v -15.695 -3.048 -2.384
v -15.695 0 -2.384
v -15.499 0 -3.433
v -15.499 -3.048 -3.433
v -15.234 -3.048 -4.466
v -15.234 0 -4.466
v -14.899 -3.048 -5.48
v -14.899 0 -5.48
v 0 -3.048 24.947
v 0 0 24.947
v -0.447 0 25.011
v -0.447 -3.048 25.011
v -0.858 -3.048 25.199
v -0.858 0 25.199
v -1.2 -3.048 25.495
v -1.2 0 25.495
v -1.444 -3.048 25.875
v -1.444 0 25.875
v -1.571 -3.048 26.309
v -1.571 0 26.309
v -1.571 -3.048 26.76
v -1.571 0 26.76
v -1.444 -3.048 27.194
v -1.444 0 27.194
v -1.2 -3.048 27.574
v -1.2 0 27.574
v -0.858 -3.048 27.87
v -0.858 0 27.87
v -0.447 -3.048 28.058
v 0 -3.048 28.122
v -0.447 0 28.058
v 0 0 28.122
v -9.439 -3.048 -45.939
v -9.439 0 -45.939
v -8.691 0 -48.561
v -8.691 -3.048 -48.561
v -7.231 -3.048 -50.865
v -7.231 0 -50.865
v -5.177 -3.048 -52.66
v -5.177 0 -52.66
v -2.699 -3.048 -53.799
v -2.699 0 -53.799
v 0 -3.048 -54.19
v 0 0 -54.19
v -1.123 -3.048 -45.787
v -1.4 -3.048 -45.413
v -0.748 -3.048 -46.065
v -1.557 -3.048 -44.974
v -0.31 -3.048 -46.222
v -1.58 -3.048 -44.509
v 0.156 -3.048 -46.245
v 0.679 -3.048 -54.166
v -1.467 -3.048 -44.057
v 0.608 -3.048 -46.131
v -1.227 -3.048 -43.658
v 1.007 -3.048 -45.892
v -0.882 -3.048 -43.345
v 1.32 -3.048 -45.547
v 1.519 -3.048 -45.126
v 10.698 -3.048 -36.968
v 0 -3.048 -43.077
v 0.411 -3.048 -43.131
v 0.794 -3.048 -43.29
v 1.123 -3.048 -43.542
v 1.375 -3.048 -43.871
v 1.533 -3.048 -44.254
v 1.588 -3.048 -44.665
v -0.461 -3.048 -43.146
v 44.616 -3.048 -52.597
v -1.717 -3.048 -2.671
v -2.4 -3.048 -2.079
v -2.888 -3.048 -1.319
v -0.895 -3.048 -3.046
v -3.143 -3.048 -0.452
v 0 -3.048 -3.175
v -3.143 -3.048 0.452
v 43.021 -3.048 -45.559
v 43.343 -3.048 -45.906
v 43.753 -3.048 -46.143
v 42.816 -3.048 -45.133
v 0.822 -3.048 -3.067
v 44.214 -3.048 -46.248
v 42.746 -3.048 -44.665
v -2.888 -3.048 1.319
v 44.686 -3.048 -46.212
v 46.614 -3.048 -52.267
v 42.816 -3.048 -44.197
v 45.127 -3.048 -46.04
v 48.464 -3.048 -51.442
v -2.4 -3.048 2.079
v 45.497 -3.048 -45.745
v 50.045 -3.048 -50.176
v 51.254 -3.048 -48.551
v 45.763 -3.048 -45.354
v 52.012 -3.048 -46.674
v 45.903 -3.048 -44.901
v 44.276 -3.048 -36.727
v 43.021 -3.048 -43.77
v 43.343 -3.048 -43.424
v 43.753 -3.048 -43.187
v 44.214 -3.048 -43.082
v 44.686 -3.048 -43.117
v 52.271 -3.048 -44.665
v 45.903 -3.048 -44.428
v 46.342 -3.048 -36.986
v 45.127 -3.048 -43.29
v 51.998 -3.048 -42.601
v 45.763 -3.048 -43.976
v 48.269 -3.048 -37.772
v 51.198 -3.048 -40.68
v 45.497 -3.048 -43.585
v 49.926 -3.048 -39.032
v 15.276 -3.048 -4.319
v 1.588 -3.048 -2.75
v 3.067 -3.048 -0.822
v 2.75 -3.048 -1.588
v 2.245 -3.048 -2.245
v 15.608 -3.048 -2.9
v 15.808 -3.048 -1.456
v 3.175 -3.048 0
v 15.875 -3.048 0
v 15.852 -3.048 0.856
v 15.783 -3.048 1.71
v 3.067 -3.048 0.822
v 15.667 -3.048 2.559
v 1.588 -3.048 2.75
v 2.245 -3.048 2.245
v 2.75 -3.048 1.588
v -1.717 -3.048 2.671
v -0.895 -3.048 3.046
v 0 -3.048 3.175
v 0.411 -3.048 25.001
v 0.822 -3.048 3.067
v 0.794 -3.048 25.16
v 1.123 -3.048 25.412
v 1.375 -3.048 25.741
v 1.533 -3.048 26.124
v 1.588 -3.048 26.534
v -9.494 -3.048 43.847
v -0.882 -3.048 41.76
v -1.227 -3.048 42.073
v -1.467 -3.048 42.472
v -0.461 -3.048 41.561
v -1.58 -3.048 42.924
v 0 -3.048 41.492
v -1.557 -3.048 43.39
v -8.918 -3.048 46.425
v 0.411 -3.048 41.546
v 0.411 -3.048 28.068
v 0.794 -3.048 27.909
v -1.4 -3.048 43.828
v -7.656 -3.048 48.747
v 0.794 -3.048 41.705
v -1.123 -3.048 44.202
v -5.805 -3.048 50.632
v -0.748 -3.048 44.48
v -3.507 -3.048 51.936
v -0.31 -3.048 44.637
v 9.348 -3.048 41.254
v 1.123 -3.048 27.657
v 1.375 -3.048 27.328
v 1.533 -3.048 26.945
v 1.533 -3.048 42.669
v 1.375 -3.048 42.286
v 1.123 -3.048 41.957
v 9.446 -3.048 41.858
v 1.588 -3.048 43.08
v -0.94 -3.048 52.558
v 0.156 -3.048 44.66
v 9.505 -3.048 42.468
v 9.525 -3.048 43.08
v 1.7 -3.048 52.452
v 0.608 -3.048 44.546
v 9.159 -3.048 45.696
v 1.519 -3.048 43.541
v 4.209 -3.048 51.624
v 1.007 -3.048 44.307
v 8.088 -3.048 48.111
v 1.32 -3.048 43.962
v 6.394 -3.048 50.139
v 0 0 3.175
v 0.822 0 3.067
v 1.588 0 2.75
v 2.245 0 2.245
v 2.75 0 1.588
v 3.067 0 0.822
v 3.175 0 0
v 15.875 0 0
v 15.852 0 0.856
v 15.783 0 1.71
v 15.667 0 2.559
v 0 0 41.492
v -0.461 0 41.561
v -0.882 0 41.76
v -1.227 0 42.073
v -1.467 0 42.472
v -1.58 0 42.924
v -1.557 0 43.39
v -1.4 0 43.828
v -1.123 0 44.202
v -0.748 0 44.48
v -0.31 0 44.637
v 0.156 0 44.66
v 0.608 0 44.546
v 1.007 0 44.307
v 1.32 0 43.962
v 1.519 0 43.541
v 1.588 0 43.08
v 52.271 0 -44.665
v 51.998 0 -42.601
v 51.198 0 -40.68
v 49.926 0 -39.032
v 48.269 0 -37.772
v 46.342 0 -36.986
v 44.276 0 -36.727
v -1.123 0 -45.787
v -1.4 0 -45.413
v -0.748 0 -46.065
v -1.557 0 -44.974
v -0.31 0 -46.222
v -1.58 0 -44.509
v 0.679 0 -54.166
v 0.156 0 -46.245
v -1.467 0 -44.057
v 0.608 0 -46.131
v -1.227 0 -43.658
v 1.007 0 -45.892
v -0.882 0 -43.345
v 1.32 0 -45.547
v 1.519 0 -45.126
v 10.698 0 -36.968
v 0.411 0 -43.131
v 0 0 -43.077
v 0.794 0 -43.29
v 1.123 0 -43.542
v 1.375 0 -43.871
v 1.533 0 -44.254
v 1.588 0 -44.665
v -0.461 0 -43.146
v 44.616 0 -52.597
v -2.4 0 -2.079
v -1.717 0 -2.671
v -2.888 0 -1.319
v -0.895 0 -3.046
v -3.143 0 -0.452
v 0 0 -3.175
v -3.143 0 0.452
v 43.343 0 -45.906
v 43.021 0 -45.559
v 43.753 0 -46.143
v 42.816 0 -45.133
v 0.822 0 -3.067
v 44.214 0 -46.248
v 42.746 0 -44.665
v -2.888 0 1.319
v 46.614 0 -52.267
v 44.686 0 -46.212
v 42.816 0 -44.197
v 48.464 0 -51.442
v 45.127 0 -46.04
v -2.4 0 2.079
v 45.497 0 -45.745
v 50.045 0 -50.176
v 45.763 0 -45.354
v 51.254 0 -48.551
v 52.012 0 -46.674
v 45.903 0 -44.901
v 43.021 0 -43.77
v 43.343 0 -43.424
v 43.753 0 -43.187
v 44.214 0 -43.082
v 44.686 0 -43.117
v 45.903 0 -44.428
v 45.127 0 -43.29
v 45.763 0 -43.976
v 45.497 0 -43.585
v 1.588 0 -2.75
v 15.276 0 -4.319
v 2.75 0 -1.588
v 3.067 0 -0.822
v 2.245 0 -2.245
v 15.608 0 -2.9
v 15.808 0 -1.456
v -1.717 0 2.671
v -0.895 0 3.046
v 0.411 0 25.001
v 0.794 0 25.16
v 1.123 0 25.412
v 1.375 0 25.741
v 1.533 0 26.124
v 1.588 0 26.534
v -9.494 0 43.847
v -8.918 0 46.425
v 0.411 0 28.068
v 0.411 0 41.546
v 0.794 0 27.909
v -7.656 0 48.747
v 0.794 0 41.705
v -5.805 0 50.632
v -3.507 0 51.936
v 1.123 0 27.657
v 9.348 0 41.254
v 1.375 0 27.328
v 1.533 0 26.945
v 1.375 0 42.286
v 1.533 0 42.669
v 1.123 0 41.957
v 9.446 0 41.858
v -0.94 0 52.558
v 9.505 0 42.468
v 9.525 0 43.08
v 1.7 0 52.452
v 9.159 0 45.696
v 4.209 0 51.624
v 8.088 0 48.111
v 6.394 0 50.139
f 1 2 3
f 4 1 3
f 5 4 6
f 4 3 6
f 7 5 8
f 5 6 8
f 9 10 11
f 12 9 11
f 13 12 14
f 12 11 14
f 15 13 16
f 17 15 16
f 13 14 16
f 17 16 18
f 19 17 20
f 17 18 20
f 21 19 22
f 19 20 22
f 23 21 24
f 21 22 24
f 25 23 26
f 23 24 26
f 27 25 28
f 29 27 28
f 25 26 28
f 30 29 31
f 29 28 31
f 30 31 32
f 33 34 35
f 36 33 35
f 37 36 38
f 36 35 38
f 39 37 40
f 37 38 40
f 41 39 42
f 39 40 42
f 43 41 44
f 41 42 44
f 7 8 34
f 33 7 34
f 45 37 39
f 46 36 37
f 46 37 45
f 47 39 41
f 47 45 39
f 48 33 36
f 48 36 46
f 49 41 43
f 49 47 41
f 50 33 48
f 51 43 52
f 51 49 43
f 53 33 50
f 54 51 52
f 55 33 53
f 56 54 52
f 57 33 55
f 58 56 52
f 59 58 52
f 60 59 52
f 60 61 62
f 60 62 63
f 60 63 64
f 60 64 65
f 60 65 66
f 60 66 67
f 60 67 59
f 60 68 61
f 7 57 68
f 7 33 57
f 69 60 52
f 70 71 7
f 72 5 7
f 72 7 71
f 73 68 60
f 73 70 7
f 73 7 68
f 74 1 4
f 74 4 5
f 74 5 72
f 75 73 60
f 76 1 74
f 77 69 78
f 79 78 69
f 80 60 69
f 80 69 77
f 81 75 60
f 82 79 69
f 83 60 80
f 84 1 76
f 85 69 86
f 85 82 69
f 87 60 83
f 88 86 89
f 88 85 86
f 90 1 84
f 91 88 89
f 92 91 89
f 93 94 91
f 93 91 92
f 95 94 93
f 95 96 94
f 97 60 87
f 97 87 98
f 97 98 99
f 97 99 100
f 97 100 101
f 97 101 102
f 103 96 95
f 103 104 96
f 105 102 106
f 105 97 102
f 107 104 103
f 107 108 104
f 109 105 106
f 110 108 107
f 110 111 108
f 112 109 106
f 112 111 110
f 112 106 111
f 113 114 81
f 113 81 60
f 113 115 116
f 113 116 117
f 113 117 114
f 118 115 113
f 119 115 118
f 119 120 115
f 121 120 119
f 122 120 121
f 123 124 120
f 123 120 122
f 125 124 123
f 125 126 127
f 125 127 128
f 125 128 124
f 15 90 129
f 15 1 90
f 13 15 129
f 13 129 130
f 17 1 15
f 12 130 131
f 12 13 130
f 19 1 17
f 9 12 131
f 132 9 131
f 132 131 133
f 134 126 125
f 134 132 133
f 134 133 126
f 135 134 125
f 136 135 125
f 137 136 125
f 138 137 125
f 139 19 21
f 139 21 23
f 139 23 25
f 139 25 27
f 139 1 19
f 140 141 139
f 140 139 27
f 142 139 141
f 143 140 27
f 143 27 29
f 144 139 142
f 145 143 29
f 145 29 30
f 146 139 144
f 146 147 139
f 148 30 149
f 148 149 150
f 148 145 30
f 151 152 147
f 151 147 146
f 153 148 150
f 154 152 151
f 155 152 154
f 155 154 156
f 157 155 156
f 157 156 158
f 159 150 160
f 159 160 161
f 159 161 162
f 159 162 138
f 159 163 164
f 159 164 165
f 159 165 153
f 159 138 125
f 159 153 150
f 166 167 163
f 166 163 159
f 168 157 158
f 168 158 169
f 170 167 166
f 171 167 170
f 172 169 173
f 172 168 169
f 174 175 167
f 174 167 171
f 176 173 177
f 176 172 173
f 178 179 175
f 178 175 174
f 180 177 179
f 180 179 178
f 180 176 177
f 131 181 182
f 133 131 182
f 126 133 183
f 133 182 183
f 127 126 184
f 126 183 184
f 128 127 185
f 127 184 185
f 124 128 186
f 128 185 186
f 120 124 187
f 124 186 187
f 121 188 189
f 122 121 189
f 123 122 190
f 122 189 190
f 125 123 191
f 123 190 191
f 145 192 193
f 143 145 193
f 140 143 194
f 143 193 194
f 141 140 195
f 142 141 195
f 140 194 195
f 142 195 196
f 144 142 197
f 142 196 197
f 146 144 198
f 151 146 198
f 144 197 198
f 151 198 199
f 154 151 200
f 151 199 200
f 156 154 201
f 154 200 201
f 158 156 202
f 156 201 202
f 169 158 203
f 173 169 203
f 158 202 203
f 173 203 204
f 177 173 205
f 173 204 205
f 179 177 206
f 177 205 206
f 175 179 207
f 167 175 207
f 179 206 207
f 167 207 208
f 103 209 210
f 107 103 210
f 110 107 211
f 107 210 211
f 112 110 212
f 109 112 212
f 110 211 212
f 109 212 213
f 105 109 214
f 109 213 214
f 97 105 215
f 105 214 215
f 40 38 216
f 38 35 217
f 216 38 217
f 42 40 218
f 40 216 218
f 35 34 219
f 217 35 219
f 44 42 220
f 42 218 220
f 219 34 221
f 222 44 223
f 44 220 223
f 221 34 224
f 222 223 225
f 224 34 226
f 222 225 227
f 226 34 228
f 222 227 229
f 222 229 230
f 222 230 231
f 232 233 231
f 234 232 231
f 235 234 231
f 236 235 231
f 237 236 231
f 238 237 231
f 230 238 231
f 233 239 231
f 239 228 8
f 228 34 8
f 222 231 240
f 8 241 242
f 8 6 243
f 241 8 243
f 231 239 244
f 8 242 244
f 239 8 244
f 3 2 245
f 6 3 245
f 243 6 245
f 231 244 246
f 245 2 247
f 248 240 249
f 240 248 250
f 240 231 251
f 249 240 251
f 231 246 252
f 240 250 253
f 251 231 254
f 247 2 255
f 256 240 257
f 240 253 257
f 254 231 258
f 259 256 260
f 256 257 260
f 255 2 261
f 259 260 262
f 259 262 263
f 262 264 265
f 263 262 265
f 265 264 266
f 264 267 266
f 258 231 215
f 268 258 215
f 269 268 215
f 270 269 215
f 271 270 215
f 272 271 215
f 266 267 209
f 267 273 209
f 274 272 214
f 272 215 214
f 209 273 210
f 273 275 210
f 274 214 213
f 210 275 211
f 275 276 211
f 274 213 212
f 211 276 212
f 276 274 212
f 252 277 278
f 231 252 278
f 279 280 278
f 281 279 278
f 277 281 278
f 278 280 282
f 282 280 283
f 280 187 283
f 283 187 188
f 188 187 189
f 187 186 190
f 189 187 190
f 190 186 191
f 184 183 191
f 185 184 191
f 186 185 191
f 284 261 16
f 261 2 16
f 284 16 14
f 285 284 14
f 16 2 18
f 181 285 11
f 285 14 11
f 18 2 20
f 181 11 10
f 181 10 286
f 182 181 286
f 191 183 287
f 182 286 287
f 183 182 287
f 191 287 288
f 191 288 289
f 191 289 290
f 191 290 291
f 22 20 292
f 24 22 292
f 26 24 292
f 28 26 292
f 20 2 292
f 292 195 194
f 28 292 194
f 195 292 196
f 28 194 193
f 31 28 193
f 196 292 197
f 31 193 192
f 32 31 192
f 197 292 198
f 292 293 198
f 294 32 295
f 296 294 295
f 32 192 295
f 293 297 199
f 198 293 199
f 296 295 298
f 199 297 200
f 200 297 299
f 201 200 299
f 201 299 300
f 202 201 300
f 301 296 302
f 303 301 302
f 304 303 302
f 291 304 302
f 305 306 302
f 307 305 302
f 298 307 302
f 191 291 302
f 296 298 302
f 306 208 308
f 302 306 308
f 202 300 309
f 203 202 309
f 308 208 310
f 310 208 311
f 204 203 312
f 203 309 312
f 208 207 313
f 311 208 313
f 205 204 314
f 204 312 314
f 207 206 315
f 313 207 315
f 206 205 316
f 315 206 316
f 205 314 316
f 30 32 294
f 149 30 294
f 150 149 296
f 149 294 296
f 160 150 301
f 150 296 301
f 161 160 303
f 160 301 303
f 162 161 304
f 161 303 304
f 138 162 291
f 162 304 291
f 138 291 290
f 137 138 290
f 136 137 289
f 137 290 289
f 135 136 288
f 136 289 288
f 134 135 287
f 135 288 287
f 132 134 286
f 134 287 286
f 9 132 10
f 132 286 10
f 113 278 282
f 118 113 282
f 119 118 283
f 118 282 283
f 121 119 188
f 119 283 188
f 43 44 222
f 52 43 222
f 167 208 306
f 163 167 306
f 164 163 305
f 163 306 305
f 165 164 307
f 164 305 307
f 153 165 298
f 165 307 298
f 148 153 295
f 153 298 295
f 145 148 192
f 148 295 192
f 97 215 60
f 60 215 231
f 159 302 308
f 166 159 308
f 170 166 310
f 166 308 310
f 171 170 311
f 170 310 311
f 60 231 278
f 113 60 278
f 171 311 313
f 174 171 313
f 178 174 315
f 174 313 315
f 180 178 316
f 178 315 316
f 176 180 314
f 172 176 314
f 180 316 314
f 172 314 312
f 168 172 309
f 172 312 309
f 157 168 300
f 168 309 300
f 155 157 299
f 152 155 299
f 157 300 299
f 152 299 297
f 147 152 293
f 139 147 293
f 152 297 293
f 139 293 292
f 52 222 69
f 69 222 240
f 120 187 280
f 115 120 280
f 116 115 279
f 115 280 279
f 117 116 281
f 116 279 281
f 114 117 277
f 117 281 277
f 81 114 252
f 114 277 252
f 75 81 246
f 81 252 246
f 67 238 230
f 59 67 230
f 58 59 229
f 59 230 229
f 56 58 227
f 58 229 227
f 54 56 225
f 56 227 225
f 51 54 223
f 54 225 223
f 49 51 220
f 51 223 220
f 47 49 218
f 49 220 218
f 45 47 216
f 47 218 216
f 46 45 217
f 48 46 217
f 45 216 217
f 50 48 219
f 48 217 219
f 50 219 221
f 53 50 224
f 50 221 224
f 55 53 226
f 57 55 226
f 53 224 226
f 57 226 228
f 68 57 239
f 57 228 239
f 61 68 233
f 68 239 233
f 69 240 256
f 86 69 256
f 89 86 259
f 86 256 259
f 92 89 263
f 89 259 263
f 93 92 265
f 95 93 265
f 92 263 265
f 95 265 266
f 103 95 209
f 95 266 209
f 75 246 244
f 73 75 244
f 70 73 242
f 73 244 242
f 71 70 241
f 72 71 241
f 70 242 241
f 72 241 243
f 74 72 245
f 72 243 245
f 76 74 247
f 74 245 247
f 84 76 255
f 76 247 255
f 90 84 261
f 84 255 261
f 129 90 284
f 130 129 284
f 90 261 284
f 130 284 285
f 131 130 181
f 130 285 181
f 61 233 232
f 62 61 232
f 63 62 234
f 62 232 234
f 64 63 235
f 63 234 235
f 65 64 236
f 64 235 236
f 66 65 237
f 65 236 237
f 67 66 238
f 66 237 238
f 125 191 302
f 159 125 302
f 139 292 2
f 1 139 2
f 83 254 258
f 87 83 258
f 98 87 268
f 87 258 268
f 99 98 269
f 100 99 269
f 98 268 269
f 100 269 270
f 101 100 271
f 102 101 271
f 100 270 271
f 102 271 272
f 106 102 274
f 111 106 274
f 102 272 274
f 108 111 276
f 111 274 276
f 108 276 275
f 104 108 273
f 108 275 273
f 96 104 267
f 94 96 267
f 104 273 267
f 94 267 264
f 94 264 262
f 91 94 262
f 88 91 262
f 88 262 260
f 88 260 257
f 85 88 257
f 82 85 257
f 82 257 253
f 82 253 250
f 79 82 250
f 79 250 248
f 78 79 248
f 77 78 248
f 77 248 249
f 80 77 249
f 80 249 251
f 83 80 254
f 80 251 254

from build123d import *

# Parameters (mm, degrees)
F1_DEPTH = 3.048


with BuildPart() as f1:
    # F0 (on Front) → F1 (new body)
    with BuildSketch(Plane.XZ):
        with BuildLine():
            Line((0, 28.1219437212), (0, 33.5548328109))
            ThreePointArc((0, 33.5548328109), (-7.0011965198, 36.6215921611), (-9.4940497557, 43.8470643509))
            Line((-9.4940497557, 43.8470643509), (-14.5120441123, 6.4355419883))
            ThreePointArc((-14.5120441123, 6.4355419883), (-8.655963145, 13.3075139313), (0, 15.875))
            Line((0, 15.875), (0, 24.9469437212))
            ThreePointArc((0, 24.9469437212), (-1.5875, 26.5344437212), (0, 28.1219437212))
        make_face()
        with BuildLine():
            ThreePointArc((-9.4940497557, 43.8470643509), (-7.0011965198, 36.6215921611), (0, 33.5548328109))
            ThreePointArc((0, 33.5548328109), (6.055219513, 35.7272862011), (9.3483010398, 41.2536639606))
            ThreePointArc((9.3483010398, 41.2536639606), (9.480722346, 42.1624840233), (9.525, 43.0798328109))
            ThreePointArc((9.525, 43.0798328109), (0.3839277776, 52.5970921045), (-9.4940497557, 43.8470643509))
        make_face()
        with BuildLine():
            ThreePointArc((1.5875, 43.0798328109), (1.1225320151, 41.9573007958), (0, 41.4923328109))
            ThreePointArc((0, 41.4923328109), (-1.1225320151, 44.2023648261), (1.5875, 43.0798328109))
        make_face(mode=Mode.SUBTRACT)
        with BuildLine():
            ThreePointArc((9.3483010398, 41.2536639606), (6.055219513, 35.7272862011), (0, 33.5548328109))
            Line((0, 33.5548328109), (0, 28.1219437212))
            ThreePointArc((0, 28.1219437212), (1.1225320151, 27.6569757363), (1.5875, 26.5344437212))
            ThreePointArc((1.5875, 26.5344437212), (1.1225320151, 25.411911706), (0, 24.9469437212))
            Line((0, 24.9469437212), (0, 15.875))
            ThreePointArc((0, 15.875), (10.2809992556, 12.0961431583), (15.6674568575, 2.558597393))
            Line((15.6674568575, 2.558597393), (9.3483010398, 41.2536639606))
        make_face()
        with BuildLine():
            ThreePointArc((15.875, 0), (15.8230291445, 1.2835005625), (15.6674568575, 2.558597393))
            ThreePointArc((15.6674568575, 2.558597393), (10.2809992556, 12.0961431583), (0, 15.875))
            Line((0, 15.875), (0, 3.175))
            ThreePointArc((0, 3.175), (2.2450640303, 2.2450640303), (3.175, 0))
            ThreePointArc((3.175, 0), (2.2450640303, -2.2450640303), (0, -3.175))
            Line((0, -3.175), (0, -15.875))
            ThreePointArc((0, -15.875), (9.5773172553, -12.6605931611), (15.2761596654, -4.3190937564))
            ThreePointArc((15.2761596654, -4.3190937564), (15.7245772549, -2.1802053013), (15.875, 0))
        make_face()
        with BuildLine():
            ThreePointArc((0, 15.875), (-8.655963145, 13.3075139313), (-14.5120441123, 6.4355419883))
            Line((-14.5120441123, 6.4355419883), (-15.6949904948, -2.3838830444))
            ThreePointArc((-15.6949904948, -2.3838830444), (-15.3752760195, -3.951773314), (-14.8993476116, -5.4795132768))
            ThreePointArc((-14.8993476116, -5.4795132768), (-9.0837313845, -13.0192722198), (0, -15.875))
            Line((0, -15.875), (0, -3.175))
            ThreePointArc((0, -3.175), (-3.175, 0), (0, 3.175))
            Line((0, 3.175), (0, 15.875))
        make_face()
        with BuildLine():
            ThreePointArc((0, -15.875), (-9.0837313845, -13.0192722198), (-14.8993476116, -5.4795132768))
            Line((-14.8993476116, -5.4795132768), (-9.4394359543, -45.9385966374))
            ThreePointArc((-9.4394359543, -45.9385966374), (-7.1714354085, -38.3960912017), (0, -35.1397544709))
            Line((0, -35.1397544709), (0, -15.875))
        make_face()
        with BuildLine():
            Line((10.6975523741, -36.9681615729), (15.2761596654, -4.3190937564))
            ThreePointArc((15.2761596654, -4.3190937564), (9.5773172553, -12.6605931611), (0, -15.875))
            Line((0, -15.875), (0, -35.1397544709))
            ThreePointArc((0, -35.1397544709), (2.9798902503, -35.6178832384), (5.660615933, -37.0042680464))
            Line((5.660615933, -37.0042680464), (10.6975523741, -36.9681615729))
        make_face()
        with BuildLine():
            ThreePointArc((5.660615933, -37.0042680464), (2.9798902503, -35.6178832384), (0, -35.1397544709))
            Line((0, -35.1397544709), (0, -43.0772544709))
            ThreePointArc((0, -43.0772544709), (1.1225320151, -43.5422224557), (1.5875, -44.6647544709))
            Line((1.5875, -44.6647544709), (9.525, -44.6647544709))
            ThreePointArc((9.525, -44.6647544709), (8.5042046001, -40.374751077), (5.660615933, -37.0042680464))
        make_face()
        with BuildLine():
            ThreePointArc((0, -35.1397544709), (-7.1714354085, -38.3960912017), (-9.4394359543, -45.9385966374))
            ThreePointArc((-9.4394359543, -45.9385966374), (-6.2686632691, -51.8361898794), (0, -54.1897544709))
            Line((0, -54.1897544709), (0.6791137982, -54.1655138852))
            ThreePointArc((0.6791137982, -54.1655138852), (6.9711614501, -51.155404133), (9.525, -44.6647544709))
            Line((9.525, -44.6647544709), (1.5875, -44.6647544709))
            ThreePointArc((1.5875, -44.6647544709), (-1.1225320151, -45.787286486), (0, -43.0772544709))
            Line((0, -43.0772544709), (0, -35.1397544709))
        make_face()
        with BuildLine():
            Line((9.6182052834, -44.6647544709), (10.6975523741, -36.9681615729))
            Line((10.6975523741, -36.9681615729), (5.660615933, -37.0042680464))
            ThreePointArc((5.660615933, -37.0042680464), (8.5042046001, -40.374751077), (9.525, -44.6647544709))
            Line((9.525, -44.6647544709), (9.6182052834, -44.6647544709))
        make_face()
        with BuildLine():
            Line((44.2762012087, -36.7274583976), (10.6975523741, -36.9681615729))
            Line((10.6975523741, -36.9681615729), (9.6182052834, -44.6647544709))
            Line((9.6182052834, -44.6647544709), (36.3955984465, -44.6647544709))
            ThreePointArc((36.3955984465, -44.6647544709), (38.7003580799, -39.0722467854), (44.2762012087, -36.7274583976))
        make_face()
        with BuildLine():
            Line((36.3955984465, -44.6647544709), (9.6182052834, -44.6647544709))
            Line((9.6182052834, -44.6647544709), (9.525, -44.6647544709))
            ThreePointArc((9.525, -44.6647544709), (6.9711614501, -51.155404133), (0.6791137982, -54.1655138852))
            Line((0.6791137982, -54.1655138852), (44.6162427329, -52.5972027413))
            ThreePointArc((44.6162427329, -52.5972027413), (38.8214540242, -50.3766440016), (36.3955984465, -44.6647544709))
        make_face()
        with BuildLine():
            ThreePointArc((52.2705984465, -44.6647544709), (49.925606132, -39.0320141043), (44.2762012087, -36.7274583976))
            ThreePointArc((44.2762012087, -36.7274583976), (38.7003580799, -39.0722467854), (36.3955984465, -44.6647544709))
            ThreePointArc((36.3955984465, -44.6647544709), (38.8214540242, -50.3766440016), (44.6162427329, -52.5972027413))
            ThreePointArc((44.6162427329, -52.5972027413), (50.0449879773, -50.1763988932), (52.2705984465, -44.6647544709))
        make_face()
        with BuildLine():
            ThreePointArc((45.9205984465, -44.6647544709), (44.3330984465, -46.2522544709), (42.7455984465, -44.6647544709))
            ThreePointArc((42.7455984465, -44.6647544709), (44.3330984465, -43.0772544709), (45.9205984465, -44.6647544709))
        make_face(mode=Mode.SUBTRACT)
    extrude(amount=F1_DEPTH)


solid = f1.part
